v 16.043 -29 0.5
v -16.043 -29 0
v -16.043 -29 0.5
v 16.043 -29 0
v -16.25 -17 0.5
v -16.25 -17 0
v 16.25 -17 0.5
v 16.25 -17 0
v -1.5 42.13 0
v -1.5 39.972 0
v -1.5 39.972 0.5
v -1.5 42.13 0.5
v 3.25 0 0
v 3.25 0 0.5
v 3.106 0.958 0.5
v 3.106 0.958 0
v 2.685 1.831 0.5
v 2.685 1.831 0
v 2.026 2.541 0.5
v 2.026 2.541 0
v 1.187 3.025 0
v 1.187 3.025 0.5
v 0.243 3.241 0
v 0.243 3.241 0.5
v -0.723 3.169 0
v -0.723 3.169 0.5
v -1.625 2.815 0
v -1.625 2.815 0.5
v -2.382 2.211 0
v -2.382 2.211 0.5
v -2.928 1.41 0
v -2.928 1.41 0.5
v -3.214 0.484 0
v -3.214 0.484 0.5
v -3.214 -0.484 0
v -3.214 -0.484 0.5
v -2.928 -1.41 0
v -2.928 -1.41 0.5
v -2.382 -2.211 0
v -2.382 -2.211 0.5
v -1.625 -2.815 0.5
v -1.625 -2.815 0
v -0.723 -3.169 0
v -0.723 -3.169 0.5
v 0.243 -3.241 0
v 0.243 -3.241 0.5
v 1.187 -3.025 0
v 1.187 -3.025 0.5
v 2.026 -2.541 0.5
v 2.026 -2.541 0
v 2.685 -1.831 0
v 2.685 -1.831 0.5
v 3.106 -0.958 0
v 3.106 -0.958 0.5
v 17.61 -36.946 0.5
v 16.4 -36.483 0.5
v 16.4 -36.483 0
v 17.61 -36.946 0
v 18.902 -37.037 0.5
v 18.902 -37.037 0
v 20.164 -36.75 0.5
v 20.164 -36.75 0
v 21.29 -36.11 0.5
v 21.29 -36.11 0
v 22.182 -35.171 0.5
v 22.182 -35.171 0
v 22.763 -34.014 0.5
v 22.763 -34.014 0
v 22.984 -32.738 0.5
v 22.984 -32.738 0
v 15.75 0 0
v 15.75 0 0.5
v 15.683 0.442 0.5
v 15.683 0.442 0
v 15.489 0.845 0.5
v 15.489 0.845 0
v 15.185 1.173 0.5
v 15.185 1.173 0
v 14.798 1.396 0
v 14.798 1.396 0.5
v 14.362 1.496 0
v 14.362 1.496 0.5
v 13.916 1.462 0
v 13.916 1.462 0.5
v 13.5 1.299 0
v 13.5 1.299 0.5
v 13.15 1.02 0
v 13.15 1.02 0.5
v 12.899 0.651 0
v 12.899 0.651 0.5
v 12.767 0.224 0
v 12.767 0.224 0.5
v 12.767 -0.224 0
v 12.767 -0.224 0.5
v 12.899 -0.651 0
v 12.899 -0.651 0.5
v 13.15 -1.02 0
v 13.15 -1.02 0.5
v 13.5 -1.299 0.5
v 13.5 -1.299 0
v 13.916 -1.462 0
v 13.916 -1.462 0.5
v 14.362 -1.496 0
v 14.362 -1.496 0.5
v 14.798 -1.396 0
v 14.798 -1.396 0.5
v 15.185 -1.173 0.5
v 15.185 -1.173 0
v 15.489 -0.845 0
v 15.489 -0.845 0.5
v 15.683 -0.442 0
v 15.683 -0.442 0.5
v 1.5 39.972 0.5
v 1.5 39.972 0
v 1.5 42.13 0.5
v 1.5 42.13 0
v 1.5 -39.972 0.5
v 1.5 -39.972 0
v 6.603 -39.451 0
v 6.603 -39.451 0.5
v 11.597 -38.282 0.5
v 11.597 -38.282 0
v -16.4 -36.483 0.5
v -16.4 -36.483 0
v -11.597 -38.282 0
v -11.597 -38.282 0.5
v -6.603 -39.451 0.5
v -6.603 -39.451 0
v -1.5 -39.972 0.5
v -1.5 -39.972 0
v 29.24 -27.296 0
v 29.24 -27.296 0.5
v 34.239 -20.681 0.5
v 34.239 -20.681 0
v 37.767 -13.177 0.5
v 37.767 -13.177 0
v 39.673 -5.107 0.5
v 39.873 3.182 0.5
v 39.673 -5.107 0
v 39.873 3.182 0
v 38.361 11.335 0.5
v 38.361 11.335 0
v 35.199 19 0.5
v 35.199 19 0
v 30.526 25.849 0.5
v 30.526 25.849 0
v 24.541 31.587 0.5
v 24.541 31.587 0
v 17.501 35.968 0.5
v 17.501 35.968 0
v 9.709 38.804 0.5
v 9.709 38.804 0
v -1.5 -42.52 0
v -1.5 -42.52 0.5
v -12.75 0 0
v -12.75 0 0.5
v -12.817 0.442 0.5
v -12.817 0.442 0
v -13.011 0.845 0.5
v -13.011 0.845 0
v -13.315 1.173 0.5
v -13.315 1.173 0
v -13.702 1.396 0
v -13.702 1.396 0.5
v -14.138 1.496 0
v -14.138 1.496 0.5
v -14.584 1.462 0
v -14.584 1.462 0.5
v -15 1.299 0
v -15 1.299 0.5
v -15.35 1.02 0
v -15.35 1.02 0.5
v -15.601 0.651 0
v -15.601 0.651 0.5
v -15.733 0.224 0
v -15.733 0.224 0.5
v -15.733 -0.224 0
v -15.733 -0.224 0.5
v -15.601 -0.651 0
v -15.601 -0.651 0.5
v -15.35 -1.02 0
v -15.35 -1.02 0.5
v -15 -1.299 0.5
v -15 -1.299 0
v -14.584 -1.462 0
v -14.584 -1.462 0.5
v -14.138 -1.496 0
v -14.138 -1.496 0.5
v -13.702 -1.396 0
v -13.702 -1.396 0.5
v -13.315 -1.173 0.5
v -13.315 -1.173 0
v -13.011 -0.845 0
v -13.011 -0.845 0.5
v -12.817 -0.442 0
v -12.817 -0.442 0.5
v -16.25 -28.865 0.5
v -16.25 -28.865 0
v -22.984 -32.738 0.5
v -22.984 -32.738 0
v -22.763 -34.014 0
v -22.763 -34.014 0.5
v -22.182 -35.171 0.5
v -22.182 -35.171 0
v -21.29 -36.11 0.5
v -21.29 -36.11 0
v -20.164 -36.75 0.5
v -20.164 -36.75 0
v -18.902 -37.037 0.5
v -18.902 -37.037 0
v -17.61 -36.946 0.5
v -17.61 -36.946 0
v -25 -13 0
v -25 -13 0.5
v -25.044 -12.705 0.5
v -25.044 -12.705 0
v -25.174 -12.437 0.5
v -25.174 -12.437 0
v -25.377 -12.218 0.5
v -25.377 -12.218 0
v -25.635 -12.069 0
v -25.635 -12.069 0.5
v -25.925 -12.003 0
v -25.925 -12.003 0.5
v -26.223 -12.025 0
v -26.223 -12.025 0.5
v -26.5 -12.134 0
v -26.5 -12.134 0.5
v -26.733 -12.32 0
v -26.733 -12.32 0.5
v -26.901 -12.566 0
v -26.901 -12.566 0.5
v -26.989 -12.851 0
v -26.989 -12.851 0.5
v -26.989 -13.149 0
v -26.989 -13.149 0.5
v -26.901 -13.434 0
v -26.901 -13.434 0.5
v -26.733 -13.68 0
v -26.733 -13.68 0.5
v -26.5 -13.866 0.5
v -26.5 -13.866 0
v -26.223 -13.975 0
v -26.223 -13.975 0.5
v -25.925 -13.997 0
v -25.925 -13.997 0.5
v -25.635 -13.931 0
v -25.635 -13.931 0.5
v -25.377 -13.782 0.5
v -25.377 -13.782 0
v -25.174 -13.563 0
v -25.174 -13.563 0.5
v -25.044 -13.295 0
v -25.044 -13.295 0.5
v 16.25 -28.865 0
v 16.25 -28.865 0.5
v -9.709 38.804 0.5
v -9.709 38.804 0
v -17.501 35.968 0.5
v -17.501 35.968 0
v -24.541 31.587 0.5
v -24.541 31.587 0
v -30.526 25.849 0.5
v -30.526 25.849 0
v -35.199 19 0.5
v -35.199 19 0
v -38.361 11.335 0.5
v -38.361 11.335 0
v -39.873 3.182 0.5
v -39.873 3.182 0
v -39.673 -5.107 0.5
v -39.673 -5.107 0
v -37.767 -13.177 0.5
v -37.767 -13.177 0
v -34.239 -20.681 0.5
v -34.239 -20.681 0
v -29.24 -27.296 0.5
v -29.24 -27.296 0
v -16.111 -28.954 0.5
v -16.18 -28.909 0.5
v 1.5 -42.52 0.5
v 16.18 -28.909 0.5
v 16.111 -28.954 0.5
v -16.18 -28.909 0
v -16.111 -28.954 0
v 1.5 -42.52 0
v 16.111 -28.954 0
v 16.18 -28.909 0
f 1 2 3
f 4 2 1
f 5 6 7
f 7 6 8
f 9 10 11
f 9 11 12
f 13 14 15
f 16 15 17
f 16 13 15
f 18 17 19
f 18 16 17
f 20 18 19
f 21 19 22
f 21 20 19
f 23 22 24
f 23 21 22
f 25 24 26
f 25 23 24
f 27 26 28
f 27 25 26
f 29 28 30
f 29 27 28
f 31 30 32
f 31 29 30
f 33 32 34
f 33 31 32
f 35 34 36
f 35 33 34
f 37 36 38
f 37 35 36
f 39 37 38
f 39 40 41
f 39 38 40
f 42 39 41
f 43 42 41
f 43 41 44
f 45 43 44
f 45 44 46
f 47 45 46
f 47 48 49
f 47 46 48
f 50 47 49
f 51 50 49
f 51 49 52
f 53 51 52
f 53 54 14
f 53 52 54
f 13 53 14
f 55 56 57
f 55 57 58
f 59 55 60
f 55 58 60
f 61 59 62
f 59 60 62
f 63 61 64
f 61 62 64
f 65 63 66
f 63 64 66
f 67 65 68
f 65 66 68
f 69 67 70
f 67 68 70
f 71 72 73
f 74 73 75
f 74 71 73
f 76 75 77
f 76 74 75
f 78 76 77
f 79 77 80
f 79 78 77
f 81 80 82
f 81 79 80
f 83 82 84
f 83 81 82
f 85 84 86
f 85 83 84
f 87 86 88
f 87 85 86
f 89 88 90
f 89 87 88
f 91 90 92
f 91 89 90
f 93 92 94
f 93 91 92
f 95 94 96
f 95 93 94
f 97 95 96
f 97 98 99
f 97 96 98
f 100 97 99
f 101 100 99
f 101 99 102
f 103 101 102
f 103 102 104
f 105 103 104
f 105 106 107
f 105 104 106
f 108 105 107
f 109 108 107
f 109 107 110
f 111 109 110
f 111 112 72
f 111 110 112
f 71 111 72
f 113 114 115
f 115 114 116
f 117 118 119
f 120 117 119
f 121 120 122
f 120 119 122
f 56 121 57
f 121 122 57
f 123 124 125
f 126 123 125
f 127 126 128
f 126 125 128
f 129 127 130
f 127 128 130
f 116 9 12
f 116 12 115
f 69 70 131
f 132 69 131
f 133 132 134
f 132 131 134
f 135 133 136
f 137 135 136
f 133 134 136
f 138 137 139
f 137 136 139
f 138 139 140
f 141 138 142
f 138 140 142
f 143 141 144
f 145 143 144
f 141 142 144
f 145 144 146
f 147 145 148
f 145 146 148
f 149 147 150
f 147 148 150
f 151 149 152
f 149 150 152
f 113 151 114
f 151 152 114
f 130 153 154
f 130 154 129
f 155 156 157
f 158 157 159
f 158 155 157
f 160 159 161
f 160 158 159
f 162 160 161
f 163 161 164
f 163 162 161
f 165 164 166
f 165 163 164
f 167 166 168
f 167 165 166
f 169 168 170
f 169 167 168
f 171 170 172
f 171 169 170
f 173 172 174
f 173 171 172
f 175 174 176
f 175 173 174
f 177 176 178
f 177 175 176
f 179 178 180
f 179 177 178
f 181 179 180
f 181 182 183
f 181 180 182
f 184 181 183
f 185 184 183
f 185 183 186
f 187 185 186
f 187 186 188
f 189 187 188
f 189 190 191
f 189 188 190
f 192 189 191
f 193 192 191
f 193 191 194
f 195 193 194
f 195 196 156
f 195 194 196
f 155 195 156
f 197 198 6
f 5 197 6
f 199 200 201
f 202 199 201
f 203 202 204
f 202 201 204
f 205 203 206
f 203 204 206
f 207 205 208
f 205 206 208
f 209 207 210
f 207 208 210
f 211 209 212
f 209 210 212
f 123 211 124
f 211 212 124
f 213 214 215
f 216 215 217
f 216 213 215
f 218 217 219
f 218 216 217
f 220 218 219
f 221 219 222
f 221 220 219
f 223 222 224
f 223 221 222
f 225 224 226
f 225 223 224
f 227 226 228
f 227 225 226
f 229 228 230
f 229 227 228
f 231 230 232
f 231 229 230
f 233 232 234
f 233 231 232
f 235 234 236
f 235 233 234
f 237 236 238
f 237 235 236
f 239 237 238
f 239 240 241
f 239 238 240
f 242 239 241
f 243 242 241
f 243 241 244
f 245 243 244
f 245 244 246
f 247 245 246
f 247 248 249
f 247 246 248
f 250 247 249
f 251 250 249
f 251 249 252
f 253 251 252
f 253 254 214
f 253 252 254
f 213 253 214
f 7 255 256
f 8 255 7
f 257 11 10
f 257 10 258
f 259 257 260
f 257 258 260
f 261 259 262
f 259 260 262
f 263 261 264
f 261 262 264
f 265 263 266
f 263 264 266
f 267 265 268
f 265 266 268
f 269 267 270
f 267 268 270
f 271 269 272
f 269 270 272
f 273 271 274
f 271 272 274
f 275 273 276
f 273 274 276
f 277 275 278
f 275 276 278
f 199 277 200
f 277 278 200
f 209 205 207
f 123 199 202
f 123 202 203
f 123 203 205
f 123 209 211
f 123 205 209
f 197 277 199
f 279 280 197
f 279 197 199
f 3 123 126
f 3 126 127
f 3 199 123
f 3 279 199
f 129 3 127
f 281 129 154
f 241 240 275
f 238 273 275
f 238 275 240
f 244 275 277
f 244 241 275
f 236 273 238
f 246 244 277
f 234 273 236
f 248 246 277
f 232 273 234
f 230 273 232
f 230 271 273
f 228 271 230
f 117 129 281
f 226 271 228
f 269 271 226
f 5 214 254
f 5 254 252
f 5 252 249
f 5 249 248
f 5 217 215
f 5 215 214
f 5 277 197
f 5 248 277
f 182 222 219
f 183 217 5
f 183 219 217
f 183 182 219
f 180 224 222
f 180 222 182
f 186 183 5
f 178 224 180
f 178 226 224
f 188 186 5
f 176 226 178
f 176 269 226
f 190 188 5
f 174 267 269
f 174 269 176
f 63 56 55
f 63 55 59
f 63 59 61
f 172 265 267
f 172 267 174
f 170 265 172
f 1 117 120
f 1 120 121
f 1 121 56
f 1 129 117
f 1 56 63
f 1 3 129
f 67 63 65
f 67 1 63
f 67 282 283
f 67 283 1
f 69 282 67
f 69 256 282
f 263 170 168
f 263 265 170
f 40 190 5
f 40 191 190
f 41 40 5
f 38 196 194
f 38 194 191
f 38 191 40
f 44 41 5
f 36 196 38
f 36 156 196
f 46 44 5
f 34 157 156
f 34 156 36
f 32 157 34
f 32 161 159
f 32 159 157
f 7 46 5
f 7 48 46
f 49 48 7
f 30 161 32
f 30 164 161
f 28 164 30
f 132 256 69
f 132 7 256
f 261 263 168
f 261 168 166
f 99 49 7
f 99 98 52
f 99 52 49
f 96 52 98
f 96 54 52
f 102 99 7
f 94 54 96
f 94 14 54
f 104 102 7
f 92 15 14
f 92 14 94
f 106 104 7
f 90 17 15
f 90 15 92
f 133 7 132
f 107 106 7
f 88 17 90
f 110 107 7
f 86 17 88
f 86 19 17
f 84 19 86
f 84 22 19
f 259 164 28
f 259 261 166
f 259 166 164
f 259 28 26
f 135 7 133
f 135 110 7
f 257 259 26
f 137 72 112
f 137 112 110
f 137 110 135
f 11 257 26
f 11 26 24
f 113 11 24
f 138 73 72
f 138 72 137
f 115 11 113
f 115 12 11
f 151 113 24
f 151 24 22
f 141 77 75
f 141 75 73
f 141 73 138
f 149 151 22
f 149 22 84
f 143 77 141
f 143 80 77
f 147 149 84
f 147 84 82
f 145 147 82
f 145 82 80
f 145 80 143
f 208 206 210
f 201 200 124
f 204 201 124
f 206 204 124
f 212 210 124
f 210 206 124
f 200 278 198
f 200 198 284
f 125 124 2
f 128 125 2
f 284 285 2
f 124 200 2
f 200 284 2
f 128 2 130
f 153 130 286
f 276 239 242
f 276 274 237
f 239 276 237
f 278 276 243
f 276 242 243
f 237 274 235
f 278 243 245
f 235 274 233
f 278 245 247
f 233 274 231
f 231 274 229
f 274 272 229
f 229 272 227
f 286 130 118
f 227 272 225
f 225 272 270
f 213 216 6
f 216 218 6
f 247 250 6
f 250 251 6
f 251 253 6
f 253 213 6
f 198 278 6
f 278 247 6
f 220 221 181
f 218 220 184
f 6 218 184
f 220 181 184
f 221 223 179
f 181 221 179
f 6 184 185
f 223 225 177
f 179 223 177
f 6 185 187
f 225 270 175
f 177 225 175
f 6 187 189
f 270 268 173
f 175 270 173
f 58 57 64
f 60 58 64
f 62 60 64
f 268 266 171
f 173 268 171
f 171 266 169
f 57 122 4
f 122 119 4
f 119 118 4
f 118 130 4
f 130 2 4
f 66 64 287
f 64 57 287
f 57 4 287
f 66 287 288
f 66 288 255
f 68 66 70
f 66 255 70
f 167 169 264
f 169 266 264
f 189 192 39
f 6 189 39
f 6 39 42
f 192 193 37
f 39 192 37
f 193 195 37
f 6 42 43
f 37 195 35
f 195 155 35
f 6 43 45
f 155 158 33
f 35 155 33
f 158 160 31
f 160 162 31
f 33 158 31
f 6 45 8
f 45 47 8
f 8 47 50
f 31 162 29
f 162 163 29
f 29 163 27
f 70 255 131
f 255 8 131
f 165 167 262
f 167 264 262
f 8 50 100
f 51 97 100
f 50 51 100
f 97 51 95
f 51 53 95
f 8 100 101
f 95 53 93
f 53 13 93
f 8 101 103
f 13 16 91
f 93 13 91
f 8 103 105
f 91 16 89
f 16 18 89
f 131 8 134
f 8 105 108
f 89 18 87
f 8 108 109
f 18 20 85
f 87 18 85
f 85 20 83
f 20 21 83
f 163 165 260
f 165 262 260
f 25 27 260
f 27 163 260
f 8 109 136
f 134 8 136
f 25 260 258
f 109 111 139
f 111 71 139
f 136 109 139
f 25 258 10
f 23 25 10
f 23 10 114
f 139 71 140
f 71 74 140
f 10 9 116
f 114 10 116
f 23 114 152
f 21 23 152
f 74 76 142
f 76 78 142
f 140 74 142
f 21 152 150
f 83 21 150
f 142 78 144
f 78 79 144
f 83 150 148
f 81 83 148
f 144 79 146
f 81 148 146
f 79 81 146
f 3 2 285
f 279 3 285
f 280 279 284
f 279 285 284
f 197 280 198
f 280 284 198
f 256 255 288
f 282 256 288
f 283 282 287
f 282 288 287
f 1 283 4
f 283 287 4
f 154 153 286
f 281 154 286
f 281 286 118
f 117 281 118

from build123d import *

# Parameters (mm, degrees)
SKETCH001_R     = 40
PAD_DEPTH       = 0.5
SKETCH_W        = 32.5
SKETCH_H        = 12
POCKET_DEPTH    = 0.501
SKETCH002_R     = 3.25
SKETCH002_R_2   = 1.5
POCKET001_DEPTH = 0.501
SKETCH003_R     = 1
POCKET002_DEPTH = 0.501
SKETCH004_W     = 3
SKETCH004_H     = 3.42
SKETCH004_H_2   = 2.91
PAD001_DEPTH    = 0.5
SKETCH005_R     = 4.42
PAD002_DEPTH    = 0.5


with BuildPart() as part:
    # Sketch001 → Pad (new body)
    with BuildSketch(Plane.XY):
        Circle(SKETCH001_R)
    extrude(amount=PAD_DEPTH)

    # Sketch → Pocket (cut, through all)
    with BuildSketch(Plane.XY):
        with Locations((0, -23)):
            Rectangle(SKETCH_W, SKETCH_H)
    extrude(amount=POCKET_DEPTH, mode=Mode.SUBTRACT)

    # Sketch002 → Pocket001 (cut, through all)
    with BuildSketch(Plane.XY):
        Circle(SKETCH002_R)
        with Locations((14.25, 0)):
            Circle(SKETCH002_R_2)
        with Locations((-14.25, 0)):
            Circle(SKETCH002_R_2)
    extrude(amount=POCKET001_DEPTH, mode=Mode.SUBTRACT)

    # Sketch003 → Pocket002 (cut, through all)
    with BuildSketch(Plane.XY):
        with Locations((-26, -13)):
            Circle(SKETCH003_R)
    extrude(amount=POCKET002_DEPTH, mode=Mode.SUBTRACT)

    # Sketch004 → Pad001 (join)
    with BuildSketch(Plane.XY):
        with Locations((0, -40.81)):
            Rectangle(SKETCH004_W, SKETCH004_H)
        with Locations((0, 40.675)):
            Rectangle(SKETCH004_W, SKETCH004_H_2)
    extrude(amount=PAD001_DEPTH)

    # Sketch005 → Pad002 (join)
    with BuildSketch(Plane.XY):
        with Locations((18.565, -32.63)):
            Circle(SKETCH005_R)
        with Locations((-18.565, -32.63)):
            Circle(SKETCH005_R)
    extrude(amount=PAD002_DEPTH)


solid = part.part
